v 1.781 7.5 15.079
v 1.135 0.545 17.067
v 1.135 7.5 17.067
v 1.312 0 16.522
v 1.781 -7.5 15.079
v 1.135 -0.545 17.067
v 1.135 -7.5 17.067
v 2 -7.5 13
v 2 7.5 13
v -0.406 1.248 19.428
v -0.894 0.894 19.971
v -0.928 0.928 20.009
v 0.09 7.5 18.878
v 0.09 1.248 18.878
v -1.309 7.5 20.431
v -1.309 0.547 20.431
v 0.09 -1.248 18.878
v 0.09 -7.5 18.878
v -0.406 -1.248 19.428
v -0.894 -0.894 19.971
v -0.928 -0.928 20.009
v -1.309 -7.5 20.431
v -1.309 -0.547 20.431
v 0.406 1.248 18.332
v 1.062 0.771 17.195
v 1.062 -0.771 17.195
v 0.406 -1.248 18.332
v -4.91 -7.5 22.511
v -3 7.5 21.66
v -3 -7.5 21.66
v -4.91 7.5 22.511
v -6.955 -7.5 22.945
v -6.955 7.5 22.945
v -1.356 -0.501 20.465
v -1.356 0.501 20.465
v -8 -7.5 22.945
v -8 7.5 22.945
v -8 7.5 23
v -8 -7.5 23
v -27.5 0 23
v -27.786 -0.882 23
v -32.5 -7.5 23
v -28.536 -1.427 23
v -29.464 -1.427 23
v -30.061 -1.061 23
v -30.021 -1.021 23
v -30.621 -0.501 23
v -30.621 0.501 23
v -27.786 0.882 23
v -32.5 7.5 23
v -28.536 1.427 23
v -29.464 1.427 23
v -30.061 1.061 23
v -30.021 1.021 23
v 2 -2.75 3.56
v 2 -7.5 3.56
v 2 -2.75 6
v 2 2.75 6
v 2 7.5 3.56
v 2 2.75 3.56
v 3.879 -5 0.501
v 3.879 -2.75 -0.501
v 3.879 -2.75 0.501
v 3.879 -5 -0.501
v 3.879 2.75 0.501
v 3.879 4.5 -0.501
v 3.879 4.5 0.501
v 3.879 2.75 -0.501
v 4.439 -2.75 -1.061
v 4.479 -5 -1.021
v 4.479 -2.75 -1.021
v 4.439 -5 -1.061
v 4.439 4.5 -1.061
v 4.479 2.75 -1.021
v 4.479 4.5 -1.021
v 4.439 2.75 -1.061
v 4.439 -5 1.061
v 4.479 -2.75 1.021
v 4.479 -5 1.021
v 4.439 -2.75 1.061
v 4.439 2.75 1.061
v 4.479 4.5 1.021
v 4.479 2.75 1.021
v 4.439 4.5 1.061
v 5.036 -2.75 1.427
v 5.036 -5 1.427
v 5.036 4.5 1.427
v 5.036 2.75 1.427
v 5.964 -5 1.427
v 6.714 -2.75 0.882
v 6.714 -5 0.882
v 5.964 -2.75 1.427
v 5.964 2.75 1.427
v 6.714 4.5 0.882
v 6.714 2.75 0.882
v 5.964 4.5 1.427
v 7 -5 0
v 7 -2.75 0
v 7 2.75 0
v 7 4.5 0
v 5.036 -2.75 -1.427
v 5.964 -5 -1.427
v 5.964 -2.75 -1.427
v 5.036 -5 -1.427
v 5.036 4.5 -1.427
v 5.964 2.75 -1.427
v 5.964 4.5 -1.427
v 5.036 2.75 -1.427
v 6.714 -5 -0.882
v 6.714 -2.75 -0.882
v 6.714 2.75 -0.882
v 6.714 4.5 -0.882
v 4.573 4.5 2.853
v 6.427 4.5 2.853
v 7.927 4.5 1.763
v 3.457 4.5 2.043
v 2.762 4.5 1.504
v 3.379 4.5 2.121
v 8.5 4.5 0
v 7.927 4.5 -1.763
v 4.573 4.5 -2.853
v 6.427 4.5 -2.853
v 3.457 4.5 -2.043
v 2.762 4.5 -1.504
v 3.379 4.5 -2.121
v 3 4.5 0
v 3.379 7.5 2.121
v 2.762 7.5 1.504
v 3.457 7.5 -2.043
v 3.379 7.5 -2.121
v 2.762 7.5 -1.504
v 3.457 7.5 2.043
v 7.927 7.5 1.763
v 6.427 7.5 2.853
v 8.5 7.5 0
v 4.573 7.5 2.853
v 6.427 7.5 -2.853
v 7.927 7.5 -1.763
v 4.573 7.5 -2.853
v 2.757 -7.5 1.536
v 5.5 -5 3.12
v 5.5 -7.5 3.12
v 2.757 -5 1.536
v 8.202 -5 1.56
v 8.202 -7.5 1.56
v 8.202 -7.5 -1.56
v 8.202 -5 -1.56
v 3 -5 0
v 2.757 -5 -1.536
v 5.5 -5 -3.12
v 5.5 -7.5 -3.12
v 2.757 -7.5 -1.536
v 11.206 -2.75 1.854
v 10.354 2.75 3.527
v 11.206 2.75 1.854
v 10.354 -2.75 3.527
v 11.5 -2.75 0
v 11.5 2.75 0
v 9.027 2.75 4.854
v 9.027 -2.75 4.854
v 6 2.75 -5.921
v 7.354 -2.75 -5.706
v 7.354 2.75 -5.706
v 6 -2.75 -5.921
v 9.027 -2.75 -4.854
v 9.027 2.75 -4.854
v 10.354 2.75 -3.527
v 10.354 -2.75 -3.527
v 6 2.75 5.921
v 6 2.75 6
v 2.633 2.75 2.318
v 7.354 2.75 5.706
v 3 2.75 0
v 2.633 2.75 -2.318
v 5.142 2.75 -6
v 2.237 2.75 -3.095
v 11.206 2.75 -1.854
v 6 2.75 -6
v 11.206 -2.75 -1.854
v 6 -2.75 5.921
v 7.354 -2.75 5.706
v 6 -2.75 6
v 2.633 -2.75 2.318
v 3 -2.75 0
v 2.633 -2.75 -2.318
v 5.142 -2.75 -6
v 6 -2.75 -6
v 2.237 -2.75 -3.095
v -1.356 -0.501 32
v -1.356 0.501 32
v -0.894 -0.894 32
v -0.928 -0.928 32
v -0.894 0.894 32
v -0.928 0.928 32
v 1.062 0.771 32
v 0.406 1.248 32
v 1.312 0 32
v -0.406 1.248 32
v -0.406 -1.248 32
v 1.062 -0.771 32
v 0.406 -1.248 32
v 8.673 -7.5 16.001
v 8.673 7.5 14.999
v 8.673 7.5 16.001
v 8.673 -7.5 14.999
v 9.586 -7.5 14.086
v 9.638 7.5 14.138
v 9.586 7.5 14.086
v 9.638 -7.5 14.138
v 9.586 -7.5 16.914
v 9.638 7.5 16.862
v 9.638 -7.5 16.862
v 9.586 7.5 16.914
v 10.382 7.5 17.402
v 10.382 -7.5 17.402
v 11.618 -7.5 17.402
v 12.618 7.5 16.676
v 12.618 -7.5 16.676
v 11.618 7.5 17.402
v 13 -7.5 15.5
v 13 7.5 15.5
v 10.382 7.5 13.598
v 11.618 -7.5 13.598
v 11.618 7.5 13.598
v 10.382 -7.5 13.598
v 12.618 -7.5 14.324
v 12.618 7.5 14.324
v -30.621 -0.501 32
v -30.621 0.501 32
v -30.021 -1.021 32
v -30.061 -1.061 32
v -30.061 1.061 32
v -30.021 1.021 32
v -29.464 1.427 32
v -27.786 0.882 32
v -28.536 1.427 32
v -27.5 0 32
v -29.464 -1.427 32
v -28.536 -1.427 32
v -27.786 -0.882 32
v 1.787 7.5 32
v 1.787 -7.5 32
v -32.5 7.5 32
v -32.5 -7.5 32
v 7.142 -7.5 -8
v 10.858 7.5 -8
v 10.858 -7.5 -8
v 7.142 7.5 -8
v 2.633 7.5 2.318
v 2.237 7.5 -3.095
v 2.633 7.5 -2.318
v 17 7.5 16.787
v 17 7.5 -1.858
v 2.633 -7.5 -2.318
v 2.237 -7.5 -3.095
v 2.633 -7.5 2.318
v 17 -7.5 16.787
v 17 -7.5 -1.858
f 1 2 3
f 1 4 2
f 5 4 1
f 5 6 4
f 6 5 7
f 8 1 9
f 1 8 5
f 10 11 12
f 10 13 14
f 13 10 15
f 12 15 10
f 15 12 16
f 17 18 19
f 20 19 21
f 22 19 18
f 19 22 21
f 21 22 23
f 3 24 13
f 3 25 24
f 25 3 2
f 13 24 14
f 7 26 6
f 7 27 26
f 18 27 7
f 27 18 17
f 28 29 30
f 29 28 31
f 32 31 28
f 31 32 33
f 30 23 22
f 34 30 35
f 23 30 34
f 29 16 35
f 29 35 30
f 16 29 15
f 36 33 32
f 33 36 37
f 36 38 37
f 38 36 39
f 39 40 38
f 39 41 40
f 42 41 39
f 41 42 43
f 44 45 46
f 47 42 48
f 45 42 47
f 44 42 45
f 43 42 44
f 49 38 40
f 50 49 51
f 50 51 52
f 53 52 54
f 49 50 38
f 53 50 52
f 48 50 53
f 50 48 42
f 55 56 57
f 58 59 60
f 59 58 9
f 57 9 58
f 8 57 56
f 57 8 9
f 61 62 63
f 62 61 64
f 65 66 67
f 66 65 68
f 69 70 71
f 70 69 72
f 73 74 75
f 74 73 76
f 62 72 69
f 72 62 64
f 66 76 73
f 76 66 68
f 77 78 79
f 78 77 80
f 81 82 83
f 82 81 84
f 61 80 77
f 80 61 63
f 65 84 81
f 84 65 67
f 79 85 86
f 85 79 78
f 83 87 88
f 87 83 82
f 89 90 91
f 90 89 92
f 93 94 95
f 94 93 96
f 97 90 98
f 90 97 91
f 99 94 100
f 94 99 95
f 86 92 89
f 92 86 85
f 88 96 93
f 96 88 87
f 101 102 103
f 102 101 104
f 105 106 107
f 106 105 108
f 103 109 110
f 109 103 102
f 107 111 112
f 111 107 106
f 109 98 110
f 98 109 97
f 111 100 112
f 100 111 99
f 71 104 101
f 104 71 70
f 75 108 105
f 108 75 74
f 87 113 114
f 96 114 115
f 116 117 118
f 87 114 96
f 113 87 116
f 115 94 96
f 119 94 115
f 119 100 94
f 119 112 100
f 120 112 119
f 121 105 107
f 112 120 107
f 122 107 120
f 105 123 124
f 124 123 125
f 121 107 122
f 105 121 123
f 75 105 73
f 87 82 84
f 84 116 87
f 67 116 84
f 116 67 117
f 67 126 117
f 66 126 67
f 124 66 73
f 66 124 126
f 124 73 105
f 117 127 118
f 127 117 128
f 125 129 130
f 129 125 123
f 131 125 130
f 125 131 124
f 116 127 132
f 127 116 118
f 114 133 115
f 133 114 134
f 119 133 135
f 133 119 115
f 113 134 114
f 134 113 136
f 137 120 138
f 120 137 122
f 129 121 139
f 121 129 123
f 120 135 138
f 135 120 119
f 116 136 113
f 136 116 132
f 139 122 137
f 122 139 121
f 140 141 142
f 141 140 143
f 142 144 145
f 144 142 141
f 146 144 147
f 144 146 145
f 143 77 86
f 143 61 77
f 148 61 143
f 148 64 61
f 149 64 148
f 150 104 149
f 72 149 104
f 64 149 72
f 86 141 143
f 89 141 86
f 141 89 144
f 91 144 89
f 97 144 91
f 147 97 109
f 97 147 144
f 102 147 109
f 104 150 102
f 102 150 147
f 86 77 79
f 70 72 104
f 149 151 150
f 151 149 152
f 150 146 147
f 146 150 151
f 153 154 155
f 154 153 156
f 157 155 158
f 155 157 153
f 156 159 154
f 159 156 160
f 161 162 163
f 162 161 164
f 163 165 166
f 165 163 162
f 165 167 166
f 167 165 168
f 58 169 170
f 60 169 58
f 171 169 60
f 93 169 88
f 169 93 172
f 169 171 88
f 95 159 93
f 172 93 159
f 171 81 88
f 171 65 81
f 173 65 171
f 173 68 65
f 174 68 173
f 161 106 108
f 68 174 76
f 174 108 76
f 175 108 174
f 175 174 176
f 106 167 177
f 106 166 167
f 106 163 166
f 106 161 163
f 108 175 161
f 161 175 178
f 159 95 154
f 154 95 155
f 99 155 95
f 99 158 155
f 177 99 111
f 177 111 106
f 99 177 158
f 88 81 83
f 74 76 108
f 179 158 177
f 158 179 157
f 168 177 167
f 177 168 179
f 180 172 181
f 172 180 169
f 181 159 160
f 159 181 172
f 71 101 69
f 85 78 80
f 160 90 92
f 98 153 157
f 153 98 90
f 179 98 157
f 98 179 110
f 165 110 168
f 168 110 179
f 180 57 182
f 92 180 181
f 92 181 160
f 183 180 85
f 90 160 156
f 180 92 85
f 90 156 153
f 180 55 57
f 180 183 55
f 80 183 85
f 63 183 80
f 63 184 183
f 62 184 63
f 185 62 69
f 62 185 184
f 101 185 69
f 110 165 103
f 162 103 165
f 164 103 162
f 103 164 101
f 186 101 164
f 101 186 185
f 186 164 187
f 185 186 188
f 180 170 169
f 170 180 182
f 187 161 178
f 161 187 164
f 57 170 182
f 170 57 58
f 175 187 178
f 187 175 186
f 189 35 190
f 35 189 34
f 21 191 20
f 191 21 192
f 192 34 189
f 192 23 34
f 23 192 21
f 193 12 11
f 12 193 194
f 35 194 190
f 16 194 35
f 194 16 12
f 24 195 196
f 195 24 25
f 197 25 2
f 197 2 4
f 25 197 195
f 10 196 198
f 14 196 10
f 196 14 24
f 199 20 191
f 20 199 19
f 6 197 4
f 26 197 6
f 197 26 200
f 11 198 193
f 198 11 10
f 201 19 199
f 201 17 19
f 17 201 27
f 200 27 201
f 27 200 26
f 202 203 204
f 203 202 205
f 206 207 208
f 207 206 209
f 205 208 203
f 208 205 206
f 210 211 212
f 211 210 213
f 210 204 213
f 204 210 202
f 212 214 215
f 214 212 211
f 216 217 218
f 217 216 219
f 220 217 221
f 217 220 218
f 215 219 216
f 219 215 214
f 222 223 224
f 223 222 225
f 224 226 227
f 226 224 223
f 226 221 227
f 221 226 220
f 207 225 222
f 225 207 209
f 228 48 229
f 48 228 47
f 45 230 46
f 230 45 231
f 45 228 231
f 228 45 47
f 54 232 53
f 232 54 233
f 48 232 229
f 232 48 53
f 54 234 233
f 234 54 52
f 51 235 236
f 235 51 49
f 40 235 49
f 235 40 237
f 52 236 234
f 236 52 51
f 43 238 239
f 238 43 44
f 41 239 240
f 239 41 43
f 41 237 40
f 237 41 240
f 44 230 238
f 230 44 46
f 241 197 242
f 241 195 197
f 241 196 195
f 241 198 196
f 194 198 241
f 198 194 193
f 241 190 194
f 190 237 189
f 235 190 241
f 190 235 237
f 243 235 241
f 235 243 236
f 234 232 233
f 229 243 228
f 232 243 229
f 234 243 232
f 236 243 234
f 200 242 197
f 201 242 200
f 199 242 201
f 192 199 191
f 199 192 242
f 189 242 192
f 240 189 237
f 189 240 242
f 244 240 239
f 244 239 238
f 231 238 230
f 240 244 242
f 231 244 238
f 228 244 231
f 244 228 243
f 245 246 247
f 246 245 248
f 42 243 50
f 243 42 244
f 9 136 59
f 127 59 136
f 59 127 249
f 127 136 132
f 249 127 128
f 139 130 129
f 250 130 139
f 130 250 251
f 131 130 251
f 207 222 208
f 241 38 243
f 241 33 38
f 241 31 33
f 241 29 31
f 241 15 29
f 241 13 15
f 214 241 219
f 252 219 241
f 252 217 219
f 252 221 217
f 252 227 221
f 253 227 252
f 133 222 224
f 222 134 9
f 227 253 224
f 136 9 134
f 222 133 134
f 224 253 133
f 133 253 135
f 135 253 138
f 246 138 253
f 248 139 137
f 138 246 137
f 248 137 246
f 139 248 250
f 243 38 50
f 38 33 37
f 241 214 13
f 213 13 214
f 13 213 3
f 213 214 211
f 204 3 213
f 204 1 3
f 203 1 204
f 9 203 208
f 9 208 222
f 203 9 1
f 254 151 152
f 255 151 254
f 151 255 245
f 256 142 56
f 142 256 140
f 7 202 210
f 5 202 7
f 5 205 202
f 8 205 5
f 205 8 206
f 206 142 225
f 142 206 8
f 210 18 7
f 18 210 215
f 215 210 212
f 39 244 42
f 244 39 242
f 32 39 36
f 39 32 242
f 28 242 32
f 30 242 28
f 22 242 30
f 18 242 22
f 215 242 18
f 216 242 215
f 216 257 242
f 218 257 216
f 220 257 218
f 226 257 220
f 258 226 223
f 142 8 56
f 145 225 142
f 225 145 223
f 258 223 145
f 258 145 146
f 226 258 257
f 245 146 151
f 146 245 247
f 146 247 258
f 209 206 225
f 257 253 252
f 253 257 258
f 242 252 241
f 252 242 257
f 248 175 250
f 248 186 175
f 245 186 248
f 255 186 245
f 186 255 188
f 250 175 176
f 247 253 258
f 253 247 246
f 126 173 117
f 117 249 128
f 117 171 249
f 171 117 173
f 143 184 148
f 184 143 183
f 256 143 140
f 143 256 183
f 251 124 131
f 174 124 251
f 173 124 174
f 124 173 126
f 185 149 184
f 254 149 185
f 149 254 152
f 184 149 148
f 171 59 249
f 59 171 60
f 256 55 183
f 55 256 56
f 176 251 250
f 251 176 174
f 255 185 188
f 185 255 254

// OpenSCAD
// file: parameters.scad
// Parameters file for RepRap Huxley (and maybe Mendel)

// Set ONE OF these true.

huxley=false;
mendel=true;



pi=3.14159265;

// The relative location in your file system where the .dxf files are
// DXFs are for quick development.  They should be replaced by parameterised CSG in dure course.

fileroot="DXF-files/";

rodsize = 6;	//threaded/smooth rod diameter in mm
xaxis = 182.5;	//width of base in mm
yaxis = 266.5;	//length of base in mm


screwsize = 3;	//bearing bore/screw diameter in mm
bearingsize = 10;	//outer diameter of bearings in mm
bearingwidth = 4;	//width of bearings in mm


rodpitch = rodsize / 6;
rodnutsize = 0.8 * rodsize;
rodnutdiameter = 1.9 * rodsize;
rodwashersize = 0.2 * rodsize;
rodwasherdiameter = 2 * rodsize;
screwpitch = screwsize / 6;
nutsize = 0.8 * screwsize;
nutdiameter = 1.9 * screwsize;
pentanutradius=1.04*screwsize;
washersize = 0.2 * screwsize;
washerdiameter = 2 * screwsize;
partthick = 2 * rodsize;
vertexrodspace = 2 * rodsize;


c = [0.3, 0.3, 0.3];
rodendoffset = rodnutsize + rodwashersize * 2 + partthick / 2;
vertexoffset = vertexrodspace + rodendoffset;


renderrodthreads = false;
renderscrewthreads = false;
fn = 36;

// The gap between the joining rods at a vertex

vertex_radius=sqrt(rodsize*rodsize + vertexoffset*vertexoffset);
vertex_ang = atan(vertexoffset/rodsize)-30;
vertex_gap = 2*vertex_radius*cos(vertex_ang);

// Nema 17 dimensions - these are absolute

nema17_square=42;
nema17_screws=31;
nema17_screw_r=1.5;
nema17_hub=22;
nema17_hub_depth=2;
nema17_length=36;
nema17_shaft=5;
nema17_shaft_length=55;
nema17_shaft_projection=22;

// Nema 14 dimensions - these are absolute

nema14_square=35.3;
nema14_screws=26;
nema14_screw_r=1.5;
nema14_hub=22;
nema14_hub_depth=2;
nema14_length=36;
nema14_shaft=5;
nema14_shaft_length=66;
nema14_shaft_projection=19;

// Nema 11 dimensions - these are absolute

nema11_square=28.5;
nema11_screws=23;
nema11_screw_r=1.25;
nema11_hub=22;
nema11_hub_depth=2;
nema11_length=44.5;
nema11_shaft=5;
nema11_shaft_length=78;
nema11_shaft_projection=18;

// Limit switch parameters

limit_switch_hole_diameter=2.5;
limit_switch_centres=9.5;

// The RepRap slide bearings

bearing_mount_centres=18;
bearing_width=7;
bearing_depth=18;

// X axis parameters - many should be relative

x_bar_gap=30;
motor_center_y = 26;
bar_clamp_x=5;
bar_clamp_y=8;
bar_clamp_x_gap=23;
bearing_y=50;
bearing_x=bar_clamp_x_gap + 10;
hole_land=4;
thickness=5;
bearing_low_z = 8;
bearing_z_gap = 25;
bearing_plate_width = bearing_mount_centres+2*hole_land + 10;
bearing_plate_overlap=0.5;
bearing_plate_support=10;
// main file
include <parameters.scad>;
use <library.scad>;

hub_x=-4.5;
drive_offset=[hub_x,-14.6,0];
block_offset=[hub_x,0,0];
lever_offset=[0,0,0];
lever_spring_offset=[-29,0,0];
idler_offset=[5.5,0,0];
clamp_centres=28;
filament_radius=1.75/2;

module end_bearing(body=true)
{
	union()
	{
		rotate([90,0,0])
			translate([0,0,-22])
			{
				cylinder(h=4, r=13/2, center=true,$fn=20);
				if(!body)
					cylinder(h=20, r=6/2, center=true,$fn=20);
			}
	}
}

module body_parts()
{
	translate([0,0,-15])
		cylinder(h=10, r=4, center=true,$fn=20);
	translate([0,0,-7.5])
		cylinder(h=5, r=12.5/2, center=true,$fn=20);
	rotate([-90,0,0])
		end_bearing(body);
}


module drive(body=true)
{
	union()
	{
			rotate([90,0,0])
			{
				nema17(body = body, slots = -1, counterbore = -1, hubdepth = 7);
				if(body)
					body_parts();
				else
				{
					scale([1.03,1,1.03])
						body_parts();
				}
			}
	}
}

module filament()
{
	cylinder(h=150, r=1, center=true,$fn=15);
	translate([0, 0, -4])
		cylinder(h=10, r1=1, r2=2, center=true,$fn=15);
}

module tie_rods(radius=3/2)
{
	for(i=[-1/2,1/2])
		translate([i*clamp_centres,0,-30])
			teardrop(h=50,r=radius, center=true,   teardrop_angle=90,truncateMM=0.5);
			//cylinder(h=50, r=radius, center=true,$fn=10);
}

module mendel_mount(radius=4/2)
{
	for(i=[-1/2,1/2])
		translate([0,i*50,0])
			cylinder(h=100, r=radius, center=true,$fn=10);
}



module bearing_hole()
{
	rotate([90,0,0])
	{
		translate([0,0,-15])
		{
			teardrop(h=35,r=screwsize/2, center=false,   teardrop_angle=0,truncateMM=0.5);
			translate([0,0,-19.5])
				teardrop(h=30,r=screwsize, center=false,   teardrop_angle=0,truncateMM=0.5);
			translate([0,0,30])
				pentanut(height=20, center=true);
		}
		cylinder(h=5.5,r=6,center=true, $fn=20);
		translate([-5,0,0])
			cube([11,12,5.5],center=true);
	}
}

module lever()
{
	difference()
	{
	translate([0,0,12])
		cube([65,15,40], center=true);

	translate([-8,0,13])
	{
		rotate([90, 0, 0])
			cylinder(r=10, h=20 , center=true);
		translate([-25,0,-10])
			cube([50,20,40], center=true);
		translate([-10,0,-25])
			cube([40,20,50], center=true);
	}

	translate([32,0,10])
			cube([30,20,60], center=true);

	translate([32,0,23])
			rotate([0,-45,0])
				cube([30,20,60], center=true);

	translate([-5,0,-10])
			rotate([0,-45,0])
				cube([20,20,20], center=true);

	translate([23,0,-10])
			rotate([0,-45,0])
				cube([20,20,20], center=true);


	translate(idler_offset - lever_offset)
		bearing_hole();

	teardrop(h=200, r=filament_radius*1.5,teardrop_angle=0,truncateMM=0.5);

//	translate(drive_offset-lever_offset)
//			drive(body=false);

	translate(drive_offset-lever_offset)
		rotate([90,0,0])
			translate([0,0,-22])
				cylinder(h=100, r=7.5, center=true,$fn=20);

	translate([0.5*nema17_screws, 0, 0.5*nema17_screws]+drive_offset-lever_offset)
	rotate([90,0,0])
		translate([0,0,-100])
			teardrop(h=200, r=2,teardrop_angle=0,truncateMM=0.5);

	translate(lever_spring_offset-lever_offset)
		lever_spring();
	}

}

module lever_spring()
{
	translate([0,0,-30])
	union()
	{
		teardrop(h=200, r=3/2,teardrop_angle=0,truncateMM=0.5);
			translate([0,0,31])
				rotate([0,0,90])
					pentanut(height=10, center=true);
	}
}

module block()
{
	difference()
	{
		union()
		{
			// Filament guide

			difference()
			{
				translate([6,5,-10])
					cube([10, 17, 11], center = true);
				translate([7,11,0])
					rotate([45,0,0])
						cube([12, 17, 25], center = true);
				translate([20,0,0])
					rotate([0,45,0])
						cube([12, 17, 25], center = true);
			}
			difference()
			{
				union()
				{
					translate([-nema17_screws/2,-0.5,0])
						cube([10, 28, nema17_square], center = true);
					translate([-nema17_screws/2-8,3.5,-5])
						cube([10, 20, 10], center = true);
					translate([-8,10.5,-3])
						cube([8, 6, 22], center = true);
					translate([-nema17_screws/2+5,-0.5,-nema17_screws/2-0.5])
						cube([10, 28, 10], center = true);
		
					translate([nema17_screws/2+2.5,-0.5,0])
						cube([15, 28, nema17_square], center = true);
					translate([nema17_screws/2+5,-0.5,-nema17_screws/2-0.5])
						cube([10, 28, 10], center = true);
					translate([0,-0.5,-nema17_screws/2-1.5])
						cube([24, 28, 8], center = true);
			
				}
				translate(-block_offset)
					tie_rods();
				translate([-clamp_centres/2,0,9]-block_offset)
					cylinder(h=40, r=4, center=true,$fn=10);
				translate(drive_offset-block_offset) 
					drive(body=false);   //non manifold
		
				translate([18,-5.5,10])
					cube([20, 28,nema17_square ], center = true);
		
			}
		}
		translate(-block_offset) 
			filament();
		translate(lever_spring_offset-block_offset) 
			lever_spring();
	}

}

module sectioncube()
{
	translate([0,-50,0])
		cube([100,100,100], center=true);
}

module idler_bearing()
{
rotate([90,0,0])
cylinder(h=4, r=5, center=true,$fn=20);
}



// PEEK
//translate([0,0,-28])
//cylinder(h=40, r=4, center=true,$fn=20);

//mendel_mount();

intersection()
{
union()
{
// Idler
//translate(idler_offset)
//idler_bearing();

//translate(drive_offset)
//	drive(body=true);

//filament();
//tie_rods();

//translate(block_offset)
//block();

translate(lever_offset)
	lever();
}
//sectioncube();
}
